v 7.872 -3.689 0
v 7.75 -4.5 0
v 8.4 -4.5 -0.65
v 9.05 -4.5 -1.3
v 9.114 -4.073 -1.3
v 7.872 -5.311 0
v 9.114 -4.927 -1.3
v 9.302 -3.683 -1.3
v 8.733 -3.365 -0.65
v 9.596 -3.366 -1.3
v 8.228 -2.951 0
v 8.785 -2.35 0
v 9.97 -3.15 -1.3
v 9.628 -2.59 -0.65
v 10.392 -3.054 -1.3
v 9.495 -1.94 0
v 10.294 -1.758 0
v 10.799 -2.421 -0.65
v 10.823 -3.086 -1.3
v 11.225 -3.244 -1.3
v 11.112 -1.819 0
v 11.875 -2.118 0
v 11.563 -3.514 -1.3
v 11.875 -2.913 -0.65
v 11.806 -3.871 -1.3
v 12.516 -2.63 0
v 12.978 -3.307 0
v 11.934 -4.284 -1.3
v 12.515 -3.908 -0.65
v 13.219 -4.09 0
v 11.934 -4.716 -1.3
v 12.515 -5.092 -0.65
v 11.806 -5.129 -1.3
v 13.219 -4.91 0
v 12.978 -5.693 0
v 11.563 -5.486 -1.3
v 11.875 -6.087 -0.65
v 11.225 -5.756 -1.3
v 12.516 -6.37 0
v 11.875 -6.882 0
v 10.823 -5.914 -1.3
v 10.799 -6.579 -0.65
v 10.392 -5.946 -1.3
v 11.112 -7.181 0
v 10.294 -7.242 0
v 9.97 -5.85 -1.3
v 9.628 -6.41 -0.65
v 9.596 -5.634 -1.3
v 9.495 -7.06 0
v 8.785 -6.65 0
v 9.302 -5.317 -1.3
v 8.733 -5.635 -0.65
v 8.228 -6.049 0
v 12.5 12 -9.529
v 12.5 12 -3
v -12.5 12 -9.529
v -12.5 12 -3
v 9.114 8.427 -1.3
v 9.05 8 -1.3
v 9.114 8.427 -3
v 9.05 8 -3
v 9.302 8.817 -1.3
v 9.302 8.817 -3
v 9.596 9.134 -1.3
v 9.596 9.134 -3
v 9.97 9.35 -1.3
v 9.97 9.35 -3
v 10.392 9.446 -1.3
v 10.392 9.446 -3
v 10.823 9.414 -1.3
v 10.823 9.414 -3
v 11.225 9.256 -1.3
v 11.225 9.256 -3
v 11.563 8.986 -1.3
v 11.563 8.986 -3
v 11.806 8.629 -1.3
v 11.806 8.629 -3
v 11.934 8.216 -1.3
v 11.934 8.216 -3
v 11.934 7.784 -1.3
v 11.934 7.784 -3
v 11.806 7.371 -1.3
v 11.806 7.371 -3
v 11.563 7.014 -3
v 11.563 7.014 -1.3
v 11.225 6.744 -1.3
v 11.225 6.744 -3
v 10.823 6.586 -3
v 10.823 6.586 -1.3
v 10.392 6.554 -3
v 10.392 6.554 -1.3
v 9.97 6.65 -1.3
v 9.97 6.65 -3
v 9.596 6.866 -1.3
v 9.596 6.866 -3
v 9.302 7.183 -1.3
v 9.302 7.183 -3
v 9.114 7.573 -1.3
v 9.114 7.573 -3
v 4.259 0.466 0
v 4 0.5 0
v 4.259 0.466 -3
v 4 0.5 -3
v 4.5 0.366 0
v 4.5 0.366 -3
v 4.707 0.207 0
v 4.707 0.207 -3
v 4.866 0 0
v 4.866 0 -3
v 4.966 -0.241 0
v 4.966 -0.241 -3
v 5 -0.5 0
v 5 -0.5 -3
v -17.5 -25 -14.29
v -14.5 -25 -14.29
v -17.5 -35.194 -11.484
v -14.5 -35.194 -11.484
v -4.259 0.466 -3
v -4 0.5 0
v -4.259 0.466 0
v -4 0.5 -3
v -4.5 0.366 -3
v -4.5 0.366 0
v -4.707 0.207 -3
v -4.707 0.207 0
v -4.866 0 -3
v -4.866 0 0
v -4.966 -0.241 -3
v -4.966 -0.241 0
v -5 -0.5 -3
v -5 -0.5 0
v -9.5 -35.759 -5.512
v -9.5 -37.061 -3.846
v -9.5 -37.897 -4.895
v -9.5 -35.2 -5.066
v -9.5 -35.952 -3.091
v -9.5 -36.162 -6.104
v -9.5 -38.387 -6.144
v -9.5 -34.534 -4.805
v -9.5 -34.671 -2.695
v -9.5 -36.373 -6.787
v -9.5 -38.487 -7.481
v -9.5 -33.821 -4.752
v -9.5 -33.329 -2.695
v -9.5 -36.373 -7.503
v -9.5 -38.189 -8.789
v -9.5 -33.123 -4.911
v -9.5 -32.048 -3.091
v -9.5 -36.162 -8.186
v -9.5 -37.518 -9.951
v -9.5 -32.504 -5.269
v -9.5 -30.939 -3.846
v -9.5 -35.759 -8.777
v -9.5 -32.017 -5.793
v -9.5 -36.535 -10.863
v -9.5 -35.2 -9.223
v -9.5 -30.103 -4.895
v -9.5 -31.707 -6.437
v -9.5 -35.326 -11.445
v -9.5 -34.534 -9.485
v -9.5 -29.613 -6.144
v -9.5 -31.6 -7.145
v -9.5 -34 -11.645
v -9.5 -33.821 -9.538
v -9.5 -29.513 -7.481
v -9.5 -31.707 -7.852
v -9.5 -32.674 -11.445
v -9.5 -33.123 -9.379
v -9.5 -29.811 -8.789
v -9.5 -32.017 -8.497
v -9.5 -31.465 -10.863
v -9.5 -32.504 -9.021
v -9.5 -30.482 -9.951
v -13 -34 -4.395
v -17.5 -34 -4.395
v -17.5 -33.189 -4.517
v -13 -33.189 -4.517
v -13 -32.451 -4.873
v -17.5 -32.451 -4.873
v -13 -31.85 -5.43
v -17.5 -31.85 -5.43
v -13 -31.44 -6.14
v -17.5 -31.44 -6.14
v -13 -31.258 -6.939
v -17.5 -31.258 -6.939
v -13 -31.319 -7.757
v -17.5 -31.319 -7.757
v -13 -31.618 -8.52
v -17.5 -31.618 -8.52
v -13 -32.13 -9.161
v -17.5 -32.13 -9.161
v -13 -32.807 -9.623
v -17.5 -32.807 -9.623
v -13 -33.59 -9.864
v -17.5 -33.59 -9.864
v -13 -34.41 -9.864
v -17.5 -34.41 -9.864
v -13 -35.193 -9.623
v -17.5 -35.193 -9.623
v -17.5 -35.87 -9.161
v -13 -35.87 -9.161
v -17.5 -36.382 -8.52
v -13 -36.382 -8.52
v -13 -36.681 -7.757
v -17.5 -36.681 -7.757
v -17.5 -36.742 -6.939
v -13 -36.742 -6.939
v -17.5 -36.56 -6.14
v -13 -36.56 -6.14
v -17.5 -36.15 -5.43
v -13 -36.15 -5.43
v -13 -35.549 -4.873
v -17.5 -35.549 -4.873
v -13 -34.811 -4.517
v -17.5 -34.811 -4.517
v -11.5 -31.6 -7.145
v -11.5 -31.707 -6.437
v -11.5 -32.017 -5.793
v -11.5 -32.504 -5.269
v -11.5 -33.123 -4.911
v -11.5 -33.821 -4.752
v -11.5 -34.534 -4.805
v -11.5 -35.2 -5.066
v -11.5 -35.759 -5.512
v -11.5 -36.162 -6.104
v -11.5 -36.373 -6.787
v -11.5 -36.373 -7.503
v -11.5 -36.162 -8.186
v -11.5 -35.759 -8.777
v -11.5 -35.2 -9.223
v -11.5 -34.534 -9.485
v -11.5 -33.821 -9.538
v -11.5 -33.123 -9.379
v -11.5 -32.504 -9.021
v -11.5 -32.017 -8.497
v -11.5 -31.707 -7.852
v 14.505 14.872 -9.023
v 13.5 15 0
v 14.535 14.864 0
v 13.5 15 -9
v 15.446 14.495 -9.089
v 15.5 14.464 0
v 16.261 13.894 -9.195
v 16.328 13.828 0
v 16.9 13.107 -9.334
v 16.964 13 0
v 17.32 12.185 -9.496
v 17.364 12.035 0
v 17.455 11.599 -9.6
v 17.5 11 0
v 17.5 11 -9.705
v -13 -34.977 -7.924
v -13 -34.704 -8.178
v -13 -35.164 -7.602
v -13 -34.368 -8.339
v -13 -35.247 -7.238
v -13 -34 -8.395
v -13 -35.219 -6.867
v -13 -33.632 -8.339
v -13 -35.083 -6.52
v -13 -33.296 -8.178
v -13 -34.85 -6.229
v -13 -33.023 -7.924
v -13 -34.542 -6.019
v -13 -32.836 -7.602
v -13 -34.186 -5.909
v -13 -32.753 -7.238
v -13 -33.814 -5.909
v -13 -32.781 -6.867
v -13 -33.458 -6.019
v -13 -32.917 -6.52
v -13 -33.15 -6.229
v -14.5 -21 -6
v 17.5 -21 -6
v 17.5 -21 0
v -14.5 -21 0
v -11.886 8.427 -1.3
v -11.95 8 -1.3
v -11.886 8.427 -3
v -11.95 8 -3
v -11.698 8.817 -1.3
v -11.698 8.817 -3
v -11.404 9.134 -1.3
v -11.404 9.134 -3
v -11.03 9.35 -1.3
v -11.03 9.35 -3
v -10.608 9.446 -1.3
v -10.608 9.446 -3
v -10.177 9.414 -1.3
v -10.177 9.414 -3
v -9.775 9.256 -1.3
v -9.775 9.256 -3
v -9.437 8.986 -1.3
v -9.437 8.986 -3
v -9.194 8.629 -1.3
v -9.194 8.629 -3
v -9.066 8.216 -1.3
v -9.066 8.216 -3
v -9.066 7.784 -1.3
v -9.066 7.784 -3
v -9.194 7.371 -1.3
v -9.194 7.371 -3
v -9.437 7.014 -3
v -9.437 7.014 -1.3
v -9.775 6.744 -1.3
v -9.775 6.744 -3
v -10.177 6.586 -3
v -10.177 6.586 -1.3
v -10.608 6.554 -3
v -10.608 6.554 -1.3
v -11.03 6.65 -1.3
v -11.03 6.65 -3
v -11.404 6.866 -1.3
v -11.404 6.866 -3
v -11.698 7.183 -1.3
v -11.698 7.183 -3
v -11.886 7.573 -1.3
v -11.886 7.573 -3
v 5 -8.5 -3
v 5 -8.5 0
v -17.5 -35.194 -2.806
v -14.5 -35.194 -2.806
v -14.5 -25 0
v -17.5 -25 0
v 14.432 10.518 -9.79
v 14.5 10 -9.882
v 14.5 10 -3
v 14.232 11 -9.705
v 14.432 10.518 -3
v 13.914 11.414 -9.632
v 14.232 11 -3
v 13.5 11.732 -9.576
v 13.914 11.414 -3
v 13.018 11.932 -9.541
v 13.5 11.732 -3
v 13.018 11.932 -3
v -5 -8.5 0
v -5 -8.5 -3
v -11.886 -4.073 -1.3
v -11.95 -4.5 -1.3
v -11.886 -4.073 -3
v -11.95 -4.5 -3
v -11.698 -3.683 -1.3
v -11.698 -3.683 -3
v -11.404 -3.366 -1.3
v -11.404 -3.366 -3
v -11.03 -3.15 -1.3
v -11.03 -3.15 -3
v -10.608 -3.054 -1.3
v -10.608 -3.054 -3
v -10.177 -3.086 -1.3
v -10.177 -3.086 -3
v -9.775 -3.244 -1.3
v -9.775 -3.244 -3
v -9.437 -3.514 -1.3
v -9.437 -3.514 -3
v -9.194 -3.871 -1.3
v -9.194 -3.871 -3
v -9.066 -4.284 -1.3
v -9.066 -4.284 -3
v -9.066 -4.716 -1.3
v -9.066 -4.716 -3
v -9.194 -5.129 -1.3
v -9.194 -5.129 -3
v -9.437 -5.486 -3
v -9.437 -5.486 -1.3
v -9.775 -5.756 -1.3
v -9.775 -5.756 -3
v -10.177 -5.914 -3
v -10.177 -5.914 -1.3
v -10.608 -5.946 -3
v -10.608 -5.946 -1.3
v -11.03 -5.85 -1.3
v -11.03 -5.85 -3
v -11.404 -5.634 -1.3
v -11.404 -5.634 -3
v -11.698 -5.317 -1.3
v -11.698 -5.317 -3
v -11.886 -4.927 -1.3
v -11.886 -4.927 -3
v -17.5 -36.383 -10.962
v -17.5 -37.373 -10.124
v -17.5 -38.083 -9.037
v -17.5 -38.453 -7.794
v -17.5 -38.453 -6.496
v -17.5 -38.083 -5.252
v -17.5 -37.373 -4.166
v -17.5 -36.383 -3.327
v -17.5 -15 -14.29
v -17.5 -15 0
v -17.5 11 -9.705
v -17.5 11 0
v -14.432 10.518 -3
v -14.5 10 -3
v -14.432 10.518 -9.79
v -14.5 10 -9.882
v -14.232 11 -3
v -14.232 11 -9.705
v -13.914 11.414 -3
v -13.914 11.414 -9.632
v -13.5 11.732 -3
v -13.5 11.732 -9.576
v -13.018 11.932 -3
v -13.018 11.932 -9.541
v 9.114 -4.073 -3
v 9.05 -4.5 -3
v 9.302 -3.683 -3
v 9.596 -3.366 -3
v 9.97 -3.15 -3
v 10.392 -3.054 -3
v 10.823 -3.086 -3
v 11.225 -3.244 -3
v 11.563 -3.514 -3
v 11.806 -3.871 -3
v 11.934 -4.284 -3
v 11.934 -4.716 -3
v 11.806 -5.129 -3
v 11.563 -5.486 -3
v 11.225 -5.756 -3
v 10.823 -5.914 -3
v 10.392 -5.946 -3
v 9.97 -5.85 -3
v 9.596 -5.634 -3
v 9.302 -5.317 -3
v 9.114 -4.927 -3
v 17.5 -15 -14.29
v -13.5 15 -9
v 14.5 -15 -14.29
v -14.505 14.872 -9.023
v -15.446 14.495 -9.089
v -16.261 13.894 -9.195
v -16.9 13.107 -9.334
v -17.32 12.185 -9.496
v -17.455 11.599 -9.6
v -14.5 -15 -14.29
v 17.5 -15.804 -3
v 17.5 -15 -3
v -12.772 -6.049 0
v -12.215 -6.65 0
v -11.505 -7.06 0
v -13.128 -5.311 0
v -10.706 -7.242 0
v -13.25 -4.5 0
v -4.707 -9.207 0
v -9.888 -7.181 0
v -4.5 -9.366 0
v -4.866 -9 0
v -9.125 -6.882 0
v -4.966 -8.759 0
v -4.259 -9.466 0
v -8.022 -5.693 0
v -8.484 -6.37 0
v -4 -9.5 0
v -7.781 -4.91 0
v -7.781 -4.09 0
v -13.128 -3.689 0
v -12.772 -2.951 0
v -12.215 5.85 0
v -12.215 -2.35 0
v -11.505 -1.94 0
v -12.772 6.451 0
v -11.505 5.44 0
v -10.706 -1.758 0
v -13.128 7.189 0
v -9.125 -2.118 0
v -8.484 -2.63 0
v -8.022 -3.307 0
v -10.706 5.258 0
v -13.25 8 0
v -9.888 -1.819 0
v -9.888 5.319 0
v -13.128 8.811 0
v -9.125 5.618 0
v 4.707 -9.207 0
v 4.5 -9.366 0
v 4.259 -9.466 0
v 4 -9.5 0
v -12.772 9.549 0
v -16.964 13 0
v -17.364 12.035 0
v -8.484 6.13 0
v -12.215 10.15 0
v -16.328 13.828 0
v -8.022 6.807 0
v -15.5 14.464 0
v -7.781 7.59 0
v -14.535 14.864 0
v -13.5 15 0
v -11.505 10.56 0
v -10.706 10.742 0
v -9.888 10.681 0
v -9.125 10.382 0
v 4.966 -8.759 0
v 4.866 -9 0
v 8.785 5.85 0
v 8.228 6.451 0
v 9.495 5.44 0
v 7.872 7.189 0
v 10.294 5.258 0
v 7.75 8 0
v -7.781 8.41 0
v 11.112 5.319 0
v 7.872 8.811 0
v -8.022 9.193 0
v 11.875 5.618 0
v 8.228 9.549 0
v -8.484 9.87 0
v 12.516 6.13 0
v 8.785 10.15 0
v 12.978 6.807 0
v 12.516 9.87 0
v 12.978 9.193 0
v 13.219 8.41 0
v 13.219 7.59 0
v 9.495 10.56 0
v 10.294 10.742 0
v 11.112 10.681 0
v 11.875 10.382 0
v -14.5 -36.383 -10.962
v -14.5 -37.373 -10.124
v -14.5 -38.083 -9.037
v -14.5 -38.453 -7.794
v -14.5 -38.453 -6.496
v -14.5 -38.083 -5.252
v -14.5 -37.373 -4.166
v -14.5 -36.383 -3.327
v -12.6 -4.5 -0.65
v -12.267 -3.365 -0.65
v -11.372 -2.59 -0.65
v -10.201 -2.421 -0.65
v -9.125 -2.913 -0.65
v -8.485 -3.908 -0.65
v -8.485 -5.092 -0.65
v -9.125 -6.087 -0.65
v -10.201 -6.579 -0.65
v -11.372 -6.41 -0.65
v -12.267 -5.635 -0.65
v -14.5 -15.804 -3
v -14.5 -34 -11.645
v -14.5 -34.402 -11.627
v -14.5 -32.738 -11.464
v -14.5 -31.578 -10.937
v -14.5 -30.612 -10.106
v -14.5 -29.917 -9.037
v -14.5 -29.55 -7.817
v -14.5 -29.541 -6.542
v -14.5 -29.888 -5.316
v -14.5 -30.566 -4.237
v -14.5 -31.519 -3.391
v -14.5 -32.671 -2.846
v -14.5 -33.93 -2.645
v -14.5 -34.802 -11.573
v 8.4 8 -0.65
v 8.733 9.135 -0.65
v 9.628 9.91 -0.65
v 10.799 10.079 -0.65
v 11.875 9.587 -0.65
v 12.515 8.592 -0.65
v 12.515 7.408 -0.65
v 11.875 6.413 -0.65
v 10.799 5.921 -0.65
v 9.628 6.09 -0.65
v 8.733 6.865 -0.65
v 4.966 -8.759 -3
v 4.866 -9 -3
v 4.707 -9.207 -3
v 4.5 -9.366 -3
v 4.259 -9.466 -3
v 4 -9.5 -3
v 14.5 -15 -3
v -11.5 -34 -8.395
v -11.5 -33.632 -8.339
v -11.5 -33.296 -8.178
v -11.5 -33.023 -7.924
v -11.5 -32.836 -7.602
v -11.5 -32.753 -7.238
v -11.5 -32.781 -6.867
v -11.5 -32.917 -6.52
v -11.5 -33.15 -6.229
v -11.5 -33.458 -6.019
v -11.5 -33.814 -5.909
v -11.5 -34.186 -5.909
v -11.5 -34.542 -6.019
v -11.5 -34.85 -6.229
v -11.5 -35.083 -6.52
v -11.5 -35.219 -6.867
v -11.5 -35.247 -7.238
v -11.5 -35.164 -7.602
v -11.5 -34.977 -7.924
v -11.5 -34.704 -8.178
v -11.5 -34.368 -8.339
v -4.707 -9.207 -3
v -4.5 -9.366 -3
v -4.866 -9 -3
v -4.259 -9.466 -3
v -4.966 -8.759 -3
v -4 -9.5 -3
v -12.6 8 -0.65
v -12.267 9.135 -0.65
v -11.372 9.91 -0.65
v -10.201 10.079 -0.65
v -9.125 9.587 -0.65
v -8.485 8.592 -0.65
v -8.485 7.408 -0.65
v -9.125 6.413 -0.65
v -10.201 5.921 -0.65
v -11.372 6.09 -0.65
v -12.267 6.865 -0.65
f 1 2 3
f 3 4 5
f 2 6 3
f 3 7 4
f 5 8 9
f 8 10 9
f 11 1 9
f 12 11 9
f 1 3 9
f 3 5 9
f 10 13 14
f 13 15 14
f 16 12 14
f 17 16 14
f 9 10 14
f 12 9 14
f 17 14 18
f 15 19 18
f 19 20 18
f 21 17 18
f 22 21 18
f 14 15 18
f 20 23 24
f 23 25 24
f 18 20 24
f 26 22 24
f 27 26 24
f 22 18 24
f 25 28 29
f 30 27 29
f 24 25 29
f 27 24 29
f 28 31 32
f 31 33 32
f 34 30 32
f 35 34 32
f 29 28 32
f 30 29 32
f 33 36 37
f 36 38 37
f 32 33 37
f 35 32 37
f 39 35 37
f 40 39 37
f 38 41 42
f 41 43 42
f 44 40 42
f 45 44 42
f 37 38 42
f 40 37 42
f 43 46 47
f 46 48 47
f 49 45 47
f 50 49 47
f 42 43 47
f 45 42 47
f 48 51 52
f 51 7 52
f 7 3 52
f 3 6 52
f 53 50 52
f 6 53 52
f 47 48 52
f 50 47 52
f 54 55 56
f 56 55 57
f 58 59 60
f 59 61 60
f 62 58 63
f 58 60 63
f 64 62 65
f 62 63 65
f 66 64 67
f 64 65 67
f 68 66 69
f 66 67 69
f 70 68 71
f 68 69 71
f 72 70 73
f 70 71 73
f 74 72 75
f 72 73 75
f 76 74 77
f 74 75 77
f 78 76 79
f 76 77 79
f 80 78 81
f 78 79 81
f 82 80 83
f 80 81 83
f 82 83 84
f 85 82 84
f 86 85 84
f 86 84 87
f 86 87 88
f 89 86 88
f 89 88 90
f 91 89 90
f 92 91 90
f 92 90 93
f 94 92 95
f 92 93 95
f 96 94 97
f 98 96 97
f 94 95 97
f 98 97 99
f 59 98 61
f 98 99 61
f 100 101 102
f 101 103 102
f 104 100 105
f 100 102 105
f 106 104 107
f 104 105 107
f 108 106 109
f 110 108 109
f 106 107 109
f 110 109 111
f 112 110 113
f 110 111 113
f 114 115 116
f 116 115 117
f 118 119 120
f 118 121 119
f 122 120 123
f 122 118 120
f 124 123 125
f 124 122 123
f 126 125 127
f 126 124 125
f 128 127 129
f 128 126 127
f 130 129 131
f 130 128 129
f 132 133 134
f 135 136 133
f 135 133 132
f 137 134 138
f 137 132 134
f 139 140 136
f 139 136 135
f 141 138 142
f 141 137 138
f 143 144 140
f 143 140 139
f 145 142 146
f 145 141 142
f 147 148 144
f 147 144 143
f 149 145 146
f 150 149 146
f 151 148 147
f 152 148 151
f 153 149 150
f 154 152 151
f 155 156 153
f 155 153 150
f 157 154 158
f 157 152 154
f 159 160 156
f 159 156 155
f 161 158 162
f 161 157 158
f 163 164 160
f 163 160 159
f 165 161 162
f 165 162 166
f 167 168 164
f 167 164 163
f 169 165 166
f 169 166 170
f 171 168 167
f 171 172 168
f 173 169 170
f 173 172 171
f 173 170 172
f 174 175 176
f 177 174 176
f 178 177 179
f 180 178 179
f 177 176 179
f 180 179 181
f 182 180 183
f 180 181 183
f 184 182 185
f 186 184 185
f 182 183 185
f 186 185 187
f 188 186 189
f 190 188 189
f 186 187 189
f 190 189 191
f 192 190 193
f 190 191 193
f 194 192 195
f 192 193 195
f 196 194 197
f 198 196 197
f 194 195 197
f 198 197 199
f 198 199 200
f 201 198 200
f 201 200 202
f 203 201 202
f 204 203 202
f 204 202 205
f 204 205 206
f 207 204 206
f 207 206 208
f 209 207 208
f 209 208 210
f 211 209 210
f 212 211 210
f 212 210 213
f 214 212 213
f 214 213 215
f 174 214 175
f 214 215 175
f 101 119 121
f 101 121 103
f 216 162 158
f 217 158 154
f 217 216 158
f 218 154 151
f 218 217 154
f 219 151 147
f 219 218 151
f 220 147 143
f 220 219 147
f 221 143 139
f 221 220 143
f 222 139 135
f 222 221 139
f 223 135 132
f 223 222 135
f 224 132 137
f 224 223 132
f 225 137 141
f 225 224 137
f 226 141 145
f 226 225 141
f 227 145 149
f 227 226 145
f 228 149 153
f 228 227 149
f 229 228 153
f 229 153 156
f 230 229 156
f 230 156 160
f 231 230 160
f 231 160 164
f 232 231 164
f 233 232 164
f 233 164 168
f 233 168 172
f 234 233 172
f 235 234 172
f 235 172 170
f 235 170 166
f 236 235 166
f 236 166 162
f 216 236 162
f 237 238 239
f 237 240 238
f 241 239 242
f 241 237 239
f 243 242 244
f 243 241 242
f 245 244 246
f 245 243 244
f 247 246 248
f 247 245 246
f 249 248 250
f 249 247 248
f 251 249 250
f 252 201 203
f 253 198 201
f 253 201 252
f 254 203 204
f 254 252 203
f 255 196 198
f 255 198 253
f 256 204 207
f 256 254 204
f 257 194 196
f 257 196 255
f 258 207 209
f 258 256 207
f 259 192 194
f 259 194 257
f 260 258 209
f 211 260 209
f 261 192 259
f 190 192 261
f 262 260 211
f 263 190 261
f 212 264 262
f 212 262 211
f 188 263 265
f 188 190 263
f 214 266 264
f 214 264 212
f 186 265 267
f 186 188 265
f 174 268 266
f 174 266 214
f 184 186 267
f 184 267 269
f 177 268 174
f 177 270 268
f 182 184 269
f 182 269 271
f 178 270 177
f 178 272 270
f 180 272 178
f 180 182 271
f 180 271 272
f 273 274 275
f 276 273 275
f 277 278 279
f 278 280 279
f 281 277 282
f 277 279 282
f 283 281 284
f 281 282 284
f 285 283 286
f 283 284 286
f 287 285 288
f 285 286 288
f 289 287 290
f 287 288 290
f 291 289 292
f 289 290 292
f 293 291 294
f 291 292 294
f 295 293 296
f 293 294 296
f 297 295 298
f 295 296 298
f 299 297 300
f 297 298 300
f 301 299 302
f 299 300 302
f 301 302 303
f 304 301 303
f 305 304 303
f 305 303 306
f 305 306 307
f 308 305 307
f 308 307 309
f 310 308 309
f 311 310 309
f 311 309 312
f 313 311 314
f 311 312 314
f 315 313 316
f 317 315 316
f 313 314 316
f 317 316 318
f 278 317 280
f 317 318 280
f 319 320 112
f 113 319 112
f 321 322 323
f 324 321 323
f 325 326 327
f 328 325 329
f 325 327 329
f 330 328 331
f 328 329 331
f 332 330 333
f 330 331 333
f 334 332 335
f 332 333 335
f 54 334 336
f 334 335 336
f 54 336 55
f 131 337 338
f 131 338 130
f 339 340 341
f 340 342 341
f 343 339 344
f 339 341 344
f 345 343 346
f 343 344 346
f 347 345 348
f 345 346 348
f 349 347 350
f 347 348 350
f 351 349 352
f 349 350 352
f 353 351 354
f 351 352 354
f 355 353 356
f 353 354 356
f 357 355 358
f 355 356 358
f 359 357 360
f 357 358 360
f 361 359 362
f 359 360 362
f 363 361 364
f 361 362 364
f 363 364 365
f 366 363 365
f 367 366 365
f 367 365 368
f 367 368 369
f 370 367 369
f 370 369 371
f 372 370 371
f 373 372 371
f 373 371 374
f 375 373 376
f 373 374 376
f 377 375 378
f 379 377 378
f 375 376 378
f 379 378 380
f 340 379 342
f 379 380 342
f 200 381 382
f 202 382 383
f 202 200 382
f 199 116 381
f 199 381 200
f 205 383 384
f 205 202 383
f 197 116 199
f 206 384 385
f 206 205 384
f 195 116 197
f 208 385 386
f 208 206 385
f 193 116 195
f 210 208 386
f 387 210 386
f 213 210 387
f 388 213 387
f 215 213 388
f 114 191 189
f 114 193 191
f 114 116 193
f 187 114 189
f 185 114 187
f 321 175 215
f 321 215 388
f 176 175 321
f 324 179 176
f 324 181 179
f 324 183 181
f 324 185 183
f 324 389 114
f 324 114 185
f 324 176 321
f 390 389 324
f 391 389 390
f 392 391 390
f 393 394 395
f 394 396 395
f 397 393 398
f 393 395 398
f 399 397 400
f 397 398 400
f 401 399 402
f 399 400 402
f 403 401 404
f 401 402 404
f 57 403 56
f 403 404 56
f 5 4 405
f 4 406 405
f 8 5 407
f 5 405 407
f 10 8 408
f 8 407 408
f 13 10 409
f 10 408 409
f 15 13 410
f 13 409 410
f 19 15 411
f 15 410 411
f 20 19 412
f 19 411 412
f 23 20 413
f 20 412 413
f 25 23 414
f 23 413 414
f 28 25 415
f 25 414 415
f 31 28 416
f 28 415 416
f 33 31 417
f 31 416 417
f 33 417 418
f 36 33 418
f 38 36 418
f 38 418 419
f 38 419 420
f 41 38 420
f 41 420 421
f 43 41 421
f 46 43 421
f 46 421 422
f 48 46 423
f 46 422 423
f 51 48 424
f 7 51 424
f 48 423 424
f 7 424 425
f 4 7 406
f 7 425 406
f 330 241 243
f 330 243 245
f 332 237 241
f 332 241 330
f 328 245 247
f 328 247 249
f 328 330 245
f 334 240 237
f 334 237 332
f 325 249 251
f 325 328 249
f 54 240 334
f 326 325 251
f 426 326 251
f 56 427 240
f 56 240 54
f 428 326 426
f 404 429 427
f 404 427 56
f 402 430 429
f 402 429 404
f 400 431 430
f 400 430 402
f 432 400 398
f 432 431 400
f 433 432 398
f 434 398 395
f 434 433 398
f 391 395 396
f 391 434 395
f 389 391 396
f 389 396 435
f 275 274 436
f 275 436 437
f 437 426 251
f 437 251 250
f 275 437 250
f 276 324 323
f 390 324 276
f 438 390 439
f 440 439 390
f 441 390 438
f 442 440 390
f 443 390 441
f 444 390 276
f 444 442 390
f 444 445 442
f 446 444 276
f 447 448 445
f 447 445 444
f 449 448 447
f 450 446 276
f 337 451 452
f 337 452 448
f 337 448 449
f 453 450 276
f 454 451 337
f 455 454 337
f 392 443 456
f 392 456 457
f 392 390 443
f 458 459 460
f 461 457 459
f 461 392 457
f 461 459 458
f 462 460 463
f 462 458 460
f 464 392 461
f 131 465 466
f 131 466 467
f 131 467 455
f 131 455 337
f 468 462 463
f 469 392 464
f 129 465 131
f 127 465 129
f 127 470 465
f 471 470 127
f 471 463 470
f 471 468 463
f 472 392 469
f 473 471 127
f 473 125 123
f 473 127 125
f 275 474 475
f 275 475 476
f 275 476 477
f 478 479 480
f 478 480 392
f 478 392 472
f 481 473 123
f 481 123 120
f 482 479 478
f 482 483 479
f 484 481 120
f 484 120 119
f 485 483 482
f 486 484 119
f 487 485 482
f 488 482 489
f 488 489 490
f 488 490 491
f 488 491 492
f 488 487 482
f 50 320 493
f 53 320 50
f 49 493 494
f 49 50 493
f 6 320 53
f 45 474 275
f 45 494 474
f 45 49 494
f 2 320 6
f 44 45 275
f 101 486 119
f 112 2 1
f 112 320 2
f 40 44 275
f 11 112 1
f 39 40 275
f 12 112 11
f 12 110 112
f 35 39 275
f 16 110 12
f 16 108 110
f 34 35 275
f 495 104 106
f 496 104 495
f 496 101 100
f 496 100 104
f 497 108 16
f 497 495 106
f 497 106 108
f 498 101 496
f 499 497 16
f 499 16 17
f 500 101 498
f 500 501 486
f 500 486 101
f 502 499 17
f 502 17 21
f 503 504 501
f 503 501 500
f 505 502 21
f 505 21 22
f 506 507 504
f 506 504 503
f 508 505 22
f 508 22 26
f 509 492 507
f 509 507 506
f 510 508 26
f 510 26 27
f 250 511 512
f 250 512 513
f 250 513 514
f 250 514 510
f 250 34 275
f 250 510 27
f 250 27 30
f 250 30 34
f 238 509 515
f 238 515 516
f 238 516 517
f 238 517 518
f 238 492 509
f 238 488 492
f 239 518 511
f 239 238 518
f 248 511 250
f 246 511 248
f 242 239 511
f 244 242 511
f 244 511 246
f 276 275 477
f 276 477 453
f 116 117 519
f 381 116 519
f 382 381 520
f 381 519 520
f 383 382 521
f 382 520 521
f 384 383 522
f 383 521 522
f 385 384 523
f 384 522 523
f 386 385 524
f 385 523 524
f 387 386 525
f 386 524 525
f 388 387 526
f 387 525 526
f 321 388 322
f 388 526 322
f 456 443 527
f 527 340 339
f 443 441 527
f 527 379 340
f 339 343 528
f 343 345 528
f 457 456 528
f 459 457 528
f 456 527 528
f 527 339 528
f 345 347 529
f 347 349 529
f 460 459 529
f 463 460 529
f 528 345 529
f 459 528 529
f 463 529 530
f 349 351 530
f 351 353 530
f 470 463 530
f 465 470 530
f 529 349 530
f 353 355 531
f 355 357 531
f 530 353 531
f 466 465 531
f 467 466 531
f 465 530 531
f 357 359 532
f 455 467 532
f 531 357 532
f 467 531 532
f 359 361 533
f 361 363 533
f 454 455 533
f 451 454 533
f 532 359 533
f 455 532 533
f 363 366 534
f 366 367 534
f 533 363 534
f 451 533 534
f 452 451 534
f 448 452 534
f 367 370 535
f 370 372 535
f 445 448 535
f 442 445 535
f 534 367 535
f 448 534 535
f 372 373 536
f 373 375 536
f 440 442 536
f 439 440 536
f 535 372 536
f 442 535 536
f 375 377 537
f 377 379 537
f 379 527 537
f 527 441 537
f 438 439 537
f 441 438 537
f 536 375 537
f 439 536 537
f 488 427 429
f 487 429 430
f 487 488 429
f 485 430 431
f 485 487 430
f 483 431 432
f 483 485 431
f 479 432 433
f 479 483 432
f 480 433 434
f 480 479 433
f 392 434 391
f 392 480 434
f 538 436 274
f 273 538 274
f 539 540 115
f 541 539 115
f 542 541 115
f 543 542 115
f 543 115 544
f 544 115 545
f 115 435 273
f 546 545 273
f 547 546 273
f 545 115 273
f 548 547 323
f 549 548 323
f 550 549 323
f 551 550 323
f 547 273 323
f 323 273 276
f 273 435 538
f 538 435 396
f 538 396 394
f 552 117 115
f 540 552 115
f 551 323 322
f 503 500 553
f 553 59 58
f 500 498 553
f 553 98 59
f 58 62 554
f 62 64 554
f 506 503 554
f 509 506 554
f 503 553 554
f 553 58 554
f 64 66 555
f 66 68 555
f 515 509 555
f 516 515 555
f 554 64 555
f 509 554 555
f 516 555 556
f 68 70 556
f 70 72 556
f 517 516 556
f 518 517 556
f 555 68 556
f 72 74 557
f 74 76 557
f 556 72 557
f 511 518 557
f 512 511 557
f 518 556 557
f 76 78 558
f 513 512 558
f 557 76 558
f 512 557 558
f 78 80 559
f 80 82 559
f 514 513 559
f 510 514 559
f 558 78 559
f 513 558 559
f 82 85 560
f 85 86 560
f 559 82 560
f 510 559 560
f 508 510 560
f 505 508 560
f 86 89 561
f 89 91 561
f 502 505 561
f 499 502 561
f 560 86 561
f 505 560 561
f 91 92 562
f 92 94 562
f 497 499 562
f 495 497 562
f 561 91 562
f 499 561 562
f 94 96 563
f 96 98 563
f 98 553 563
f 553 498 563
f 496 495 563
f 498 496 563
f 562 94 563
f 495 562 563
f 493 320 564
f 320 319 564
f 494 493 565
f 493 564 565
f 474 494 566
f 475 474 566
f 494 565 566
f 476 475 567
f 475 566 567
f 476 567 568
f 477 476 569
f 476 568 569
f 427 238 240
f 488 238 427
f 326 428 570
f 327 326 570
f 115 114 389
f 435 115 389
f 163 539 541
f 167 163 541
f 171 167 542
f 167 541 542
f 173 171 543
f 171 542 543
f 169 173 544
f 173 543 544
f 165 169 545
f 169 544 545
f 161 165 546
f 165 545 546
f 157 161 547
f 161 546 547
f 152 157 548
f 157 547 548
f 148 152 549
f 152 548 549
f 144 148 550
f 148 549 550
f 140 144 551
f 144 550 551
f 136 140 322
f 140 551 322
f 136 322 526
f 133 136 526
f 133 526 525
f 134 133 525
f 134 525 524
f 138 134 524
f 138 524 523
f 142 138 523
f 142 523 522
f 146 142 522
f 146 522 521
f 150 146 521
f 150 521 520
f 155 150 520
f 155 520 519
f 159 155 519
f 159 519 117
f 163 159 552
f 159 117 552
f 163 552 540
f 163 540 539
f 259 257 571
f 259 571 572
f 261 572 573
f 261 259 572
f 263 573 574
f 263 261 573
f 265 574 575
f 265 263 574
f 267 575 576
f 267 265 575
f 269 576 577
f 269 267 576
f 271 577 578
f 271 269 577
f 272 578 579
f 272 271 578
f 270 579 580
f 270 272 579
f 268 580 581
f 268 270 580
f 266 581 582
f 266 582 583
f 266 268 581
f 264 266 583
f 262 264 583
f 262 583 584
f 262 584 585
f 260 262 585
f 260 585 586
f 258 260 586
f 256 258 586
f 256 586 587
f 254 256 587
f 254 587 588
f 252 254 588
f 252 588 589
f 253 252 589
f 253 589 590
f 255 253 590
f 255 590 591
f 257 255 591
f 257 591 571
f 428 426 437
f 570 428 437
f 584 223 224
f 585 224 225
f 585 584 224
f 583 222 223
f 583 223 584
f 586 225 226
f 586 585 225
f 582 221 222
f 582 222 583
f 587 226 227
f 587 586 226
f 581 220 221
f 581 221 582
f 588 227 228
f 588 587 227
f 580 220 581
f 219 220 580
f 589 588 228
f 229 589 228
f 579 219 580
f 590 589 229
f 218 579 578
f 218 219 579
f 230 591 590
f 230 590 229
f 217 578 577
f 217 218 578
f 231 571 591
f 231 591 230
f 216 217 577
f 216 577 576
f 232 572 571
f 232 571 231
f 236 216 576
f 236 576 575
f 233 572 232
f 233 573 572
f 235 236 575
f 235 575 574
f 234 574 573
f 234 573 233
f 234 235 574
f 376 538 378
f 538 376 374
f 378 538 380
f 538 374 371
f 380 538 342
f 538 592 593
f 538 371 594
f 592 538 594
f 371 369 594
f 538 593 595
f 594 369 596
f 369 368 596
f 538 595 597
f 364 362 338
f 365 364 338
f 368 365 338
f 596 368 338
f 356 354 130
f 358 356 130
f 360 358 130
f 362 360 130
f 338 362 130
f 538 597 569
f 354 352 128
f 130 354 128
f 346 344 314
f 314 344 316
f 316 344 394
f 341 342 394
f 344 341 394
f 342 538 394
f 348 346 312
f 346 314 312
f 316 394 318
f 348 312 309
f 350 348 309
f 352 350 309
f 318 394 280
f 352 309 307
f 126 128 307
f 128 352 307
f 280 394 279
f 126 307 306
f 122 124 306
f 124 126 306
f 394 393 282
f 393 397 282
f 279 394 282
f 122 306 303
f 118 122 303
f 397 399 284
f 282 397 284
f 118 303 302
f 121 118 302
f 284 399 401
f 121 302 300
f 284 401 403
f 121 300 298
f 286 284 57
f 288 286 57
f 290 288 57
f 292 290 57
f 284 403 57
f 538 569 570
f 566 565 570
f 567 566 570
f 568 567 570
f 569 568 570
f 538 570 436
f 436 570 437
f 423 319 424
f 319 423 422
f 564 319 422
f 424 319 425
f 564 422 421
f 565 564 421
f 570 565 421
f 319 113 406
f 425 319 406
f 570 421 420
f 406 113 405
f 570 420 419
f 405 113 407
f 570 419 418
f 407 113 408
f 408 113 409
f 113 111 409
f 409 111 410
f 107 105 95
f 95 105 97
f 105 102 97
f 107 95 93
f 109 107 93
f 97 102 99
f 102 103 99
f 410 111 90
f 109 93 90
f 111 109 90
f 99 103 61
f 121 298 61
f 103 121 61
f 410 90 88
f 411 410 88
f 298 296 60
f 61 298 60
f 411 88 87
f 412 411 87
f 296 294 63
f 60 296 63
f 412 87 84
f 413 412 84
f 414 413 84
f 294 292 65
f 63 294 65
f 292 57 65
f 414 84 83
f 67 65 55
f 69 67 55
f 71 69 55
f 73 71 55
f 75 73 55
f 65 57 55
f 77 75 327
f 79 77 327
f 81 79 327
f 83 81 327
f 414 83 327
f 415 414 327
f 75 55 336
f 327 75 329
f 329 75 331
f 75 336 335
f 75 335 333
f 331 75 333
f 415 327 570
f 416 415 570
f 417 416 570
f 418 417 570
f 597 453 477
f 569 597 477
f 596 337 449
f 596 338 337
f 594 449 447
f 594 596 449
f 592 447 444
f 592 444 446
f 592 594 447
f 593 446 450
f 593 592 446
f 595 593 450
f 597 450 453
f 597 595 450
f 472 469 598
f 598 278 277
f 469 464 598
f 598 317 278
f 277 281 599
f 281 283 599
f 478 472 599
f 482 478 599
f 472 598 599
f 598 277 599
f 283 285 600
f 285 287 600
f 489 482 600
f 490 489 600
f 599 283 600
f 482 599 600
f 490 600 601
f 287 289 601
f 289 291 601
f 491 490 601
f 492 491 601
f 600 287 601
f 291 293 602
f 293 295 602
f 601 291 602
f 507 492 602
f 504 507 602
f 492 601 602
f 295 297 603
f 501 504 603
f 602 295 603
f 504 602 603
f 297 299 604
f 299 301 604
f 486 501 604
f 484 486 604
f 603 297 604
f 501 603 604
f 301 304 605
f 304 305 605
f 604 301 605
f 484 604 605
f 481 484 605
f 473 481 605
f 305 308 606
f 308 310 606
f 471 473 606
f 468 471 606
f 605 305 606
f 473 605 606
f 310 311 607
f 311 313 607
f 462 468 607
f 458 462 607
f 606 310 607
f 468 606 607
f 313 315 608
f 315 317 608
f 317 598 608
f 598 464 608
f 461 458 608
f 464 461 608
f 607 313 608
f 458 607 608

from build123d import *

# Parameters (mm, degrees)
SKETCH1_W                                         = 35
SKETCH1_H                                         = 30
BOSS_EXTRUDE1_DEPTH                               = 3
SKETCH2_W                                         = 35
SKETCH2_H                                         = 30
SKETCH2_W_2                                       = 29
SKETCH2_H_2                                       = 24
BOSS_EXTRUDE2_DEPTH                               = 3
SKETCH3_W                                         = 10
SKETCH3_H                                         = 10
CUT_EXTRUDE1_DEPTH                                = 3
CSK_FOR_M2_5_FLAT_HEAD_MACHINE_SCREW1_D           = 2.9
CSK_FOR_M2_5_FLAT_HEAD_MACHINE_SCREW1_DEPTH       = 5
CSK_FOR_M2_5_FLAT_HEAD_MACHINE_SCREW1_CSINK_D     = 5.5
CSK_FOR_M2_5_FLAT_HEAD_MACHINE_SCREW1_CSINK_ANGLE = 90
CSK_FOR_M2_5_FLAT_HEAD_MACHINE_SCREW1_TIP         = 0.871247898
BOSS_EXTRUDE4_DEPTH                               = 3
FILLET1_R                                         = 1
BOSS_EXTRUDE5_REACH                               = 26.494
SKETCH15_W                                        = 29
SKETCH15_H                                        = 3
SKETCH16_W                                        = 29
SKETCH16_H                                        = 3
CUT_EXTRUDE6_DEPTH                                = 3
FILLET2_R                                         = 4
FILLET3_R                                         = 2
SKETCH21_W                                        = 14.289809421
SKETCH21_H                                        = 25
BOSS_EXTRUDE7_DEPTH                               = 3
SKETCH23_W                                        = 32
SKETCH23_H                                        = 6
BOSS_EXTRUDE8_DEPTH                               = 3
BOSS_EXTRUDE10_DEPTH                              = 32
SKETCH30_R                                        = 1.25
CUT_EXTRUDE13_DEPTH                               = 56.03815634
SKETCH32_R                                        = 4.5
SKETCH32_R_2                                      = 2.4
BOSS_EXTRUDE12_DEPTH                              = 5
SKETCH33_R                                        = 2.75
CUT_EXTRUDE15_DEPTH                               = 4.5
SKETCH32_4_R                                      = 2.4
SKETCH32_4_R_2                                    = 1.25
BOSS_EXTRUDE13_DEPTH                              = 3
SKETCH34_R                                        = 2.75
CUT_EXTRUDE17_DEPTH                               = 4.5
CUT_EXTRUDE18_DEPTH                               = 54.18081095


with BuildPart() as part:
    # Sketch1 → Boss-Extrude1 (new body)
    with BuildSketch(Plane.XY):
        Rectangle(SKETCH1_W, SKETCH1_H)
    extrude(amount=-BOSS_EXTRUDE1_DEPTH)

    # Sketch2 → Boss-Extrude2 (add)
    with BuildSketch(Plane(origin=(0, 0, -3), x_dir=(-1, 0, 0), z_dir=(0, 0, -1))):
        Rectangle(SKETCH2_W, SKETCH2_H)
        Rectangle(SKETCH2_W_2, SKETCH2_H_2, mode=Mode.SUBTRACT)
    extrude(amount=BOSS_EXTRUDE2_DEPTH)

    # Sketch3 → Cut-Extrude1 (cut)
    with BuildSketch(Plane.XY):
        with Locations((0, -4.5)):
            Rectangle(SKETCH3_W, SKETCH3_H)
    extrude(amount=-CUT_EXTRUDE1_DEPTH, mode=Mode.SUBTRACT)

    # CSK for M2.5 Flat Head Machine Screw1
    with Locations(Plane.XY):
        with Locations((10.5, 8), (-10.5, -4.5), (-10.5, 8), (10.5, -4.5)):
            CounterSinkHole(CSK_FOR_M2_5_FLAT_HEAD_MACHINE_SCREW1_D / 2, CSK_FOR_M2_5_FLAT_HEAD_MACHINE_SCREW1_CSINK_D / 2, depth=CSK_FOR_M2_5_FLAT_HEAD_MACHINE_SCREW1_DEPTH, counter_sink_angle=CSK_FOR_M2_5_FLAT_HEAD_MACHINE_SCREW1_CSINK_ANGLE)
            with Locations((0, 0, -(CSK_FOR_M2_5_FLAT_HEAD_MACHINE_SCREW1_DEPTH + CSK_FOR_M2_5_FLAT_HEAD_MACHINE_SCREW1_TIP / 2))):  # 118° drill point
                Cone(0, CSK_FOR_M2_5_FLAT_HEAD_MACHINE_SCREW1_D / 2, CSK_FOR_M2_5_FLAT_HEAD_MACHINE_SCREW1_TIP, mode=Mode.SUBTRACT)

    # Sketch11 → Boss-Extrude4 (add)
    with BuildSketch(Plane.ZY.offset(17.5)):
        Polygon((-6, 15), (-9, 15), (-14.289809421, -15), (-6, -15), align=None)
    boss_extrude4 = extrude(amount=-BOSS_EXTRUDE4_DEPTH)

    # Mirror1: Boss-Extrude4 across plane
    add(boss_extrude4.mirror(Plane(origin=(0, 0, 0), x_dir=(0, 0, 1), z_dir=(1, 0, 0))))

    # Fillet1
    fillet1_edges = [part.edges().sort_by_distance(p)[0] for p in [
        (5, 0.5, -1.5),
        (5, -9.5, -1.5),
        (-5, -9.5, -1.5),
        (-5, 0.5, -1.5),
    ]]
    fillet(fillet1_edges, radius=FILLET1_R)

    # Boss-Extrude5: up to this face of the body (flat: up to its plane)
    boss_extrude5_end = Plane(part.part.faces().sort_by_distance((16, 0, -11.644904711))[0])
    # Sketch15 → Boss-Extrude5 (add, up to the picked face)
    with BuildSketch(Plane(origin=(0, 0, -6), x_dir=(-1, 0, 0), z_dir=(0, 0, -1)), mode=Mode.PRIVATE) as boss_extrude5_sk1:
        with Locations((0, 13.5)):
            Rectangle(SKETCH15_W, SKETCH15_H)
    boss_extrude5_tool1 = split(extrude(boss_extrude5_sk1.sketch, amount=BOSS_EXTRUDE5_REACH, mode=Mode.PRIVATE), bisect_by=boss_extrude5_end, keep=Keep.BOTH, mode=Mode.PRIVATE)
    add(boss_extrude5_tool1.solids().sort_by(Axis((0, 13.5, -6), (0, 0, -1)))[0])

    # Sketch16 → Cut-Extrude6 (cut)
    with BuildSketch(Plane.XZ.offset(15)):
        with Locations((0, -4.5)):
            Rectangle(SKETCH16_W, SKETCH16_H)
    extrude(amount=-CUT_EXTRUDE6_DEPTH, mode=Mode.SUBTRACT)

    # Fillet2
    fillet2_edges = [part.edges().sort_by_distance(p)[0] for p in [
        (-17.5, 15, -4.5),
        (17.5, 15, -4.5),
    ]]
    fillet(fillet2_edges, radius=FILLET2_R)

    # Fillet3
    fillet3_edges = [part.edges().sort_by_distance(p)[0] for p in [
        (-14.5, 12, -6.264490471),
        (14.5, 12, -6.264490471),
    ]]
    fillet(fillet3_edges, radius=FILLET3_R)

    # Sketch21 → Boss-Extrude7 (add)
    with BuildSketch(Plane.ZY.offset(17.5)):
        with Locations((-7.144904711, -27.5)):
            Rectangle(SKETCH21_W, SKETCH21_H)
    extrude(amount=-BOSS_EXTRUDE7_DEPTH)

    # Sketch23 → Boss-Extrude8 (add)
    with BuildSketch(Plane.XY):
        with Locations((1.5, -18)):
            Rectangle(SKETCH23_W, SKETCH23_H)
    extrude(amount=-BOSS_EXTRUDE8_DEPTH)

    # Sketch27 → Boss-Extrude10 (add)
    with BuildSketch(Plane(origin=(17.5, 0, 0), x_dir=(0, 0, -1), z_dir=(1, 0, 0))):
        Polygon((3, -21), (3, -15.803847577), (6, -21), align=None)
    extrude(amount=-BOSS_EXTRUDE10_DEPTH)

    # Sketch30 → Cut-Extrude13 (cut, through all)
    with BuildSketch(Plane.ZY.offset(17.5)):
        with Locations((-7.144904711, -34)):
            Circle(SKETCH30_R)
    extrude(amount=-CUT_EXTRUDE13_DEPTH, mode=Mode.SUBTRACT)

    # Sketch32 → Boss-Extrude12 (add)
    with BuildSketch(Plane(origin=(-14.5, 0, 0), x_dir=(0, 0, -1), z_dir=(1, 0, 0))):
        with Locations((7.144904711, -34)):
            Circle(SKETCH32_R)
        with Locations(Location((7.144904711, -34, 0), (0, 0, 90))):
            Circle(SKETCH32_R_2, mode=Mode.SUBTRACT)
    extrude(amount=BOSS_EXTRUDE12_DEPTH)

    # Sketch33 → Cut-Extrude15 (cut)
    with BuildSketch(Plane.ZY.offset(17.5)):
        with Locations((-7.144904711, -34)):
            Circle(SKETCH33_R)
    extrude(amount=-CUT_EXTRUDE15_DEPTH, mode=Mode.SUBTRACT)

    # Sketch32<4> → Boss-Extrude13 (add)
    with BuildSketch(Plane(origin=(-14.5, 0, 0), x_dir=(0, 0, -1), z_dir=(1, 0, 0))):
        with Locations((7.144904711, -34)):
            Circle(SKETCH32_4_R)
        with Locations((7.144904711, -34)):
            Circle(SKETCH32_4_R_2, mode=Mode.SUBTRACT)
    extrude(amount=BOSS_EXTRUDE13_DEPTH)

    # Sketch34 → Cut-Extrude17 (cut)
    with BuildSketch(Plane.ZY.offset(17.5)):
        with Locations((-7.144904711, -34)):
            Circle(SKETCH34_R)
    extrude(amount=-CUT_EXTRUDE17_DEPTH, mode=Mode.SUBTRACT)

    # Sketch35 → Cut-Extrude18 (cut, through all)
    with BuildSketch(Plane(origin=(-14.5, 0, 0), x_dir=(0, 0, -1), z_dir=(1, 0, 0))):
        with BuildLine():
            Line((2.806290635, -35.194331572), (0, -25))
            Line((0, -25), (0, -40))
            Line((0, -40), (14.289809421, -40))
            Line((14.289809421, -40), (14.289809421, -25))
            Line((14.289809421, -25), (11.483518786, -35.194331572))
            ThreePointArc((11.483518786, -35.194331572), (7.144904711, -38.5), (2.806290635, -35.194331572))
        make_face()
    extrude(amount=-CUT_EXTRUDE18_DEPTH, mode=Mode.SUBTRACT)


solid = part.part
